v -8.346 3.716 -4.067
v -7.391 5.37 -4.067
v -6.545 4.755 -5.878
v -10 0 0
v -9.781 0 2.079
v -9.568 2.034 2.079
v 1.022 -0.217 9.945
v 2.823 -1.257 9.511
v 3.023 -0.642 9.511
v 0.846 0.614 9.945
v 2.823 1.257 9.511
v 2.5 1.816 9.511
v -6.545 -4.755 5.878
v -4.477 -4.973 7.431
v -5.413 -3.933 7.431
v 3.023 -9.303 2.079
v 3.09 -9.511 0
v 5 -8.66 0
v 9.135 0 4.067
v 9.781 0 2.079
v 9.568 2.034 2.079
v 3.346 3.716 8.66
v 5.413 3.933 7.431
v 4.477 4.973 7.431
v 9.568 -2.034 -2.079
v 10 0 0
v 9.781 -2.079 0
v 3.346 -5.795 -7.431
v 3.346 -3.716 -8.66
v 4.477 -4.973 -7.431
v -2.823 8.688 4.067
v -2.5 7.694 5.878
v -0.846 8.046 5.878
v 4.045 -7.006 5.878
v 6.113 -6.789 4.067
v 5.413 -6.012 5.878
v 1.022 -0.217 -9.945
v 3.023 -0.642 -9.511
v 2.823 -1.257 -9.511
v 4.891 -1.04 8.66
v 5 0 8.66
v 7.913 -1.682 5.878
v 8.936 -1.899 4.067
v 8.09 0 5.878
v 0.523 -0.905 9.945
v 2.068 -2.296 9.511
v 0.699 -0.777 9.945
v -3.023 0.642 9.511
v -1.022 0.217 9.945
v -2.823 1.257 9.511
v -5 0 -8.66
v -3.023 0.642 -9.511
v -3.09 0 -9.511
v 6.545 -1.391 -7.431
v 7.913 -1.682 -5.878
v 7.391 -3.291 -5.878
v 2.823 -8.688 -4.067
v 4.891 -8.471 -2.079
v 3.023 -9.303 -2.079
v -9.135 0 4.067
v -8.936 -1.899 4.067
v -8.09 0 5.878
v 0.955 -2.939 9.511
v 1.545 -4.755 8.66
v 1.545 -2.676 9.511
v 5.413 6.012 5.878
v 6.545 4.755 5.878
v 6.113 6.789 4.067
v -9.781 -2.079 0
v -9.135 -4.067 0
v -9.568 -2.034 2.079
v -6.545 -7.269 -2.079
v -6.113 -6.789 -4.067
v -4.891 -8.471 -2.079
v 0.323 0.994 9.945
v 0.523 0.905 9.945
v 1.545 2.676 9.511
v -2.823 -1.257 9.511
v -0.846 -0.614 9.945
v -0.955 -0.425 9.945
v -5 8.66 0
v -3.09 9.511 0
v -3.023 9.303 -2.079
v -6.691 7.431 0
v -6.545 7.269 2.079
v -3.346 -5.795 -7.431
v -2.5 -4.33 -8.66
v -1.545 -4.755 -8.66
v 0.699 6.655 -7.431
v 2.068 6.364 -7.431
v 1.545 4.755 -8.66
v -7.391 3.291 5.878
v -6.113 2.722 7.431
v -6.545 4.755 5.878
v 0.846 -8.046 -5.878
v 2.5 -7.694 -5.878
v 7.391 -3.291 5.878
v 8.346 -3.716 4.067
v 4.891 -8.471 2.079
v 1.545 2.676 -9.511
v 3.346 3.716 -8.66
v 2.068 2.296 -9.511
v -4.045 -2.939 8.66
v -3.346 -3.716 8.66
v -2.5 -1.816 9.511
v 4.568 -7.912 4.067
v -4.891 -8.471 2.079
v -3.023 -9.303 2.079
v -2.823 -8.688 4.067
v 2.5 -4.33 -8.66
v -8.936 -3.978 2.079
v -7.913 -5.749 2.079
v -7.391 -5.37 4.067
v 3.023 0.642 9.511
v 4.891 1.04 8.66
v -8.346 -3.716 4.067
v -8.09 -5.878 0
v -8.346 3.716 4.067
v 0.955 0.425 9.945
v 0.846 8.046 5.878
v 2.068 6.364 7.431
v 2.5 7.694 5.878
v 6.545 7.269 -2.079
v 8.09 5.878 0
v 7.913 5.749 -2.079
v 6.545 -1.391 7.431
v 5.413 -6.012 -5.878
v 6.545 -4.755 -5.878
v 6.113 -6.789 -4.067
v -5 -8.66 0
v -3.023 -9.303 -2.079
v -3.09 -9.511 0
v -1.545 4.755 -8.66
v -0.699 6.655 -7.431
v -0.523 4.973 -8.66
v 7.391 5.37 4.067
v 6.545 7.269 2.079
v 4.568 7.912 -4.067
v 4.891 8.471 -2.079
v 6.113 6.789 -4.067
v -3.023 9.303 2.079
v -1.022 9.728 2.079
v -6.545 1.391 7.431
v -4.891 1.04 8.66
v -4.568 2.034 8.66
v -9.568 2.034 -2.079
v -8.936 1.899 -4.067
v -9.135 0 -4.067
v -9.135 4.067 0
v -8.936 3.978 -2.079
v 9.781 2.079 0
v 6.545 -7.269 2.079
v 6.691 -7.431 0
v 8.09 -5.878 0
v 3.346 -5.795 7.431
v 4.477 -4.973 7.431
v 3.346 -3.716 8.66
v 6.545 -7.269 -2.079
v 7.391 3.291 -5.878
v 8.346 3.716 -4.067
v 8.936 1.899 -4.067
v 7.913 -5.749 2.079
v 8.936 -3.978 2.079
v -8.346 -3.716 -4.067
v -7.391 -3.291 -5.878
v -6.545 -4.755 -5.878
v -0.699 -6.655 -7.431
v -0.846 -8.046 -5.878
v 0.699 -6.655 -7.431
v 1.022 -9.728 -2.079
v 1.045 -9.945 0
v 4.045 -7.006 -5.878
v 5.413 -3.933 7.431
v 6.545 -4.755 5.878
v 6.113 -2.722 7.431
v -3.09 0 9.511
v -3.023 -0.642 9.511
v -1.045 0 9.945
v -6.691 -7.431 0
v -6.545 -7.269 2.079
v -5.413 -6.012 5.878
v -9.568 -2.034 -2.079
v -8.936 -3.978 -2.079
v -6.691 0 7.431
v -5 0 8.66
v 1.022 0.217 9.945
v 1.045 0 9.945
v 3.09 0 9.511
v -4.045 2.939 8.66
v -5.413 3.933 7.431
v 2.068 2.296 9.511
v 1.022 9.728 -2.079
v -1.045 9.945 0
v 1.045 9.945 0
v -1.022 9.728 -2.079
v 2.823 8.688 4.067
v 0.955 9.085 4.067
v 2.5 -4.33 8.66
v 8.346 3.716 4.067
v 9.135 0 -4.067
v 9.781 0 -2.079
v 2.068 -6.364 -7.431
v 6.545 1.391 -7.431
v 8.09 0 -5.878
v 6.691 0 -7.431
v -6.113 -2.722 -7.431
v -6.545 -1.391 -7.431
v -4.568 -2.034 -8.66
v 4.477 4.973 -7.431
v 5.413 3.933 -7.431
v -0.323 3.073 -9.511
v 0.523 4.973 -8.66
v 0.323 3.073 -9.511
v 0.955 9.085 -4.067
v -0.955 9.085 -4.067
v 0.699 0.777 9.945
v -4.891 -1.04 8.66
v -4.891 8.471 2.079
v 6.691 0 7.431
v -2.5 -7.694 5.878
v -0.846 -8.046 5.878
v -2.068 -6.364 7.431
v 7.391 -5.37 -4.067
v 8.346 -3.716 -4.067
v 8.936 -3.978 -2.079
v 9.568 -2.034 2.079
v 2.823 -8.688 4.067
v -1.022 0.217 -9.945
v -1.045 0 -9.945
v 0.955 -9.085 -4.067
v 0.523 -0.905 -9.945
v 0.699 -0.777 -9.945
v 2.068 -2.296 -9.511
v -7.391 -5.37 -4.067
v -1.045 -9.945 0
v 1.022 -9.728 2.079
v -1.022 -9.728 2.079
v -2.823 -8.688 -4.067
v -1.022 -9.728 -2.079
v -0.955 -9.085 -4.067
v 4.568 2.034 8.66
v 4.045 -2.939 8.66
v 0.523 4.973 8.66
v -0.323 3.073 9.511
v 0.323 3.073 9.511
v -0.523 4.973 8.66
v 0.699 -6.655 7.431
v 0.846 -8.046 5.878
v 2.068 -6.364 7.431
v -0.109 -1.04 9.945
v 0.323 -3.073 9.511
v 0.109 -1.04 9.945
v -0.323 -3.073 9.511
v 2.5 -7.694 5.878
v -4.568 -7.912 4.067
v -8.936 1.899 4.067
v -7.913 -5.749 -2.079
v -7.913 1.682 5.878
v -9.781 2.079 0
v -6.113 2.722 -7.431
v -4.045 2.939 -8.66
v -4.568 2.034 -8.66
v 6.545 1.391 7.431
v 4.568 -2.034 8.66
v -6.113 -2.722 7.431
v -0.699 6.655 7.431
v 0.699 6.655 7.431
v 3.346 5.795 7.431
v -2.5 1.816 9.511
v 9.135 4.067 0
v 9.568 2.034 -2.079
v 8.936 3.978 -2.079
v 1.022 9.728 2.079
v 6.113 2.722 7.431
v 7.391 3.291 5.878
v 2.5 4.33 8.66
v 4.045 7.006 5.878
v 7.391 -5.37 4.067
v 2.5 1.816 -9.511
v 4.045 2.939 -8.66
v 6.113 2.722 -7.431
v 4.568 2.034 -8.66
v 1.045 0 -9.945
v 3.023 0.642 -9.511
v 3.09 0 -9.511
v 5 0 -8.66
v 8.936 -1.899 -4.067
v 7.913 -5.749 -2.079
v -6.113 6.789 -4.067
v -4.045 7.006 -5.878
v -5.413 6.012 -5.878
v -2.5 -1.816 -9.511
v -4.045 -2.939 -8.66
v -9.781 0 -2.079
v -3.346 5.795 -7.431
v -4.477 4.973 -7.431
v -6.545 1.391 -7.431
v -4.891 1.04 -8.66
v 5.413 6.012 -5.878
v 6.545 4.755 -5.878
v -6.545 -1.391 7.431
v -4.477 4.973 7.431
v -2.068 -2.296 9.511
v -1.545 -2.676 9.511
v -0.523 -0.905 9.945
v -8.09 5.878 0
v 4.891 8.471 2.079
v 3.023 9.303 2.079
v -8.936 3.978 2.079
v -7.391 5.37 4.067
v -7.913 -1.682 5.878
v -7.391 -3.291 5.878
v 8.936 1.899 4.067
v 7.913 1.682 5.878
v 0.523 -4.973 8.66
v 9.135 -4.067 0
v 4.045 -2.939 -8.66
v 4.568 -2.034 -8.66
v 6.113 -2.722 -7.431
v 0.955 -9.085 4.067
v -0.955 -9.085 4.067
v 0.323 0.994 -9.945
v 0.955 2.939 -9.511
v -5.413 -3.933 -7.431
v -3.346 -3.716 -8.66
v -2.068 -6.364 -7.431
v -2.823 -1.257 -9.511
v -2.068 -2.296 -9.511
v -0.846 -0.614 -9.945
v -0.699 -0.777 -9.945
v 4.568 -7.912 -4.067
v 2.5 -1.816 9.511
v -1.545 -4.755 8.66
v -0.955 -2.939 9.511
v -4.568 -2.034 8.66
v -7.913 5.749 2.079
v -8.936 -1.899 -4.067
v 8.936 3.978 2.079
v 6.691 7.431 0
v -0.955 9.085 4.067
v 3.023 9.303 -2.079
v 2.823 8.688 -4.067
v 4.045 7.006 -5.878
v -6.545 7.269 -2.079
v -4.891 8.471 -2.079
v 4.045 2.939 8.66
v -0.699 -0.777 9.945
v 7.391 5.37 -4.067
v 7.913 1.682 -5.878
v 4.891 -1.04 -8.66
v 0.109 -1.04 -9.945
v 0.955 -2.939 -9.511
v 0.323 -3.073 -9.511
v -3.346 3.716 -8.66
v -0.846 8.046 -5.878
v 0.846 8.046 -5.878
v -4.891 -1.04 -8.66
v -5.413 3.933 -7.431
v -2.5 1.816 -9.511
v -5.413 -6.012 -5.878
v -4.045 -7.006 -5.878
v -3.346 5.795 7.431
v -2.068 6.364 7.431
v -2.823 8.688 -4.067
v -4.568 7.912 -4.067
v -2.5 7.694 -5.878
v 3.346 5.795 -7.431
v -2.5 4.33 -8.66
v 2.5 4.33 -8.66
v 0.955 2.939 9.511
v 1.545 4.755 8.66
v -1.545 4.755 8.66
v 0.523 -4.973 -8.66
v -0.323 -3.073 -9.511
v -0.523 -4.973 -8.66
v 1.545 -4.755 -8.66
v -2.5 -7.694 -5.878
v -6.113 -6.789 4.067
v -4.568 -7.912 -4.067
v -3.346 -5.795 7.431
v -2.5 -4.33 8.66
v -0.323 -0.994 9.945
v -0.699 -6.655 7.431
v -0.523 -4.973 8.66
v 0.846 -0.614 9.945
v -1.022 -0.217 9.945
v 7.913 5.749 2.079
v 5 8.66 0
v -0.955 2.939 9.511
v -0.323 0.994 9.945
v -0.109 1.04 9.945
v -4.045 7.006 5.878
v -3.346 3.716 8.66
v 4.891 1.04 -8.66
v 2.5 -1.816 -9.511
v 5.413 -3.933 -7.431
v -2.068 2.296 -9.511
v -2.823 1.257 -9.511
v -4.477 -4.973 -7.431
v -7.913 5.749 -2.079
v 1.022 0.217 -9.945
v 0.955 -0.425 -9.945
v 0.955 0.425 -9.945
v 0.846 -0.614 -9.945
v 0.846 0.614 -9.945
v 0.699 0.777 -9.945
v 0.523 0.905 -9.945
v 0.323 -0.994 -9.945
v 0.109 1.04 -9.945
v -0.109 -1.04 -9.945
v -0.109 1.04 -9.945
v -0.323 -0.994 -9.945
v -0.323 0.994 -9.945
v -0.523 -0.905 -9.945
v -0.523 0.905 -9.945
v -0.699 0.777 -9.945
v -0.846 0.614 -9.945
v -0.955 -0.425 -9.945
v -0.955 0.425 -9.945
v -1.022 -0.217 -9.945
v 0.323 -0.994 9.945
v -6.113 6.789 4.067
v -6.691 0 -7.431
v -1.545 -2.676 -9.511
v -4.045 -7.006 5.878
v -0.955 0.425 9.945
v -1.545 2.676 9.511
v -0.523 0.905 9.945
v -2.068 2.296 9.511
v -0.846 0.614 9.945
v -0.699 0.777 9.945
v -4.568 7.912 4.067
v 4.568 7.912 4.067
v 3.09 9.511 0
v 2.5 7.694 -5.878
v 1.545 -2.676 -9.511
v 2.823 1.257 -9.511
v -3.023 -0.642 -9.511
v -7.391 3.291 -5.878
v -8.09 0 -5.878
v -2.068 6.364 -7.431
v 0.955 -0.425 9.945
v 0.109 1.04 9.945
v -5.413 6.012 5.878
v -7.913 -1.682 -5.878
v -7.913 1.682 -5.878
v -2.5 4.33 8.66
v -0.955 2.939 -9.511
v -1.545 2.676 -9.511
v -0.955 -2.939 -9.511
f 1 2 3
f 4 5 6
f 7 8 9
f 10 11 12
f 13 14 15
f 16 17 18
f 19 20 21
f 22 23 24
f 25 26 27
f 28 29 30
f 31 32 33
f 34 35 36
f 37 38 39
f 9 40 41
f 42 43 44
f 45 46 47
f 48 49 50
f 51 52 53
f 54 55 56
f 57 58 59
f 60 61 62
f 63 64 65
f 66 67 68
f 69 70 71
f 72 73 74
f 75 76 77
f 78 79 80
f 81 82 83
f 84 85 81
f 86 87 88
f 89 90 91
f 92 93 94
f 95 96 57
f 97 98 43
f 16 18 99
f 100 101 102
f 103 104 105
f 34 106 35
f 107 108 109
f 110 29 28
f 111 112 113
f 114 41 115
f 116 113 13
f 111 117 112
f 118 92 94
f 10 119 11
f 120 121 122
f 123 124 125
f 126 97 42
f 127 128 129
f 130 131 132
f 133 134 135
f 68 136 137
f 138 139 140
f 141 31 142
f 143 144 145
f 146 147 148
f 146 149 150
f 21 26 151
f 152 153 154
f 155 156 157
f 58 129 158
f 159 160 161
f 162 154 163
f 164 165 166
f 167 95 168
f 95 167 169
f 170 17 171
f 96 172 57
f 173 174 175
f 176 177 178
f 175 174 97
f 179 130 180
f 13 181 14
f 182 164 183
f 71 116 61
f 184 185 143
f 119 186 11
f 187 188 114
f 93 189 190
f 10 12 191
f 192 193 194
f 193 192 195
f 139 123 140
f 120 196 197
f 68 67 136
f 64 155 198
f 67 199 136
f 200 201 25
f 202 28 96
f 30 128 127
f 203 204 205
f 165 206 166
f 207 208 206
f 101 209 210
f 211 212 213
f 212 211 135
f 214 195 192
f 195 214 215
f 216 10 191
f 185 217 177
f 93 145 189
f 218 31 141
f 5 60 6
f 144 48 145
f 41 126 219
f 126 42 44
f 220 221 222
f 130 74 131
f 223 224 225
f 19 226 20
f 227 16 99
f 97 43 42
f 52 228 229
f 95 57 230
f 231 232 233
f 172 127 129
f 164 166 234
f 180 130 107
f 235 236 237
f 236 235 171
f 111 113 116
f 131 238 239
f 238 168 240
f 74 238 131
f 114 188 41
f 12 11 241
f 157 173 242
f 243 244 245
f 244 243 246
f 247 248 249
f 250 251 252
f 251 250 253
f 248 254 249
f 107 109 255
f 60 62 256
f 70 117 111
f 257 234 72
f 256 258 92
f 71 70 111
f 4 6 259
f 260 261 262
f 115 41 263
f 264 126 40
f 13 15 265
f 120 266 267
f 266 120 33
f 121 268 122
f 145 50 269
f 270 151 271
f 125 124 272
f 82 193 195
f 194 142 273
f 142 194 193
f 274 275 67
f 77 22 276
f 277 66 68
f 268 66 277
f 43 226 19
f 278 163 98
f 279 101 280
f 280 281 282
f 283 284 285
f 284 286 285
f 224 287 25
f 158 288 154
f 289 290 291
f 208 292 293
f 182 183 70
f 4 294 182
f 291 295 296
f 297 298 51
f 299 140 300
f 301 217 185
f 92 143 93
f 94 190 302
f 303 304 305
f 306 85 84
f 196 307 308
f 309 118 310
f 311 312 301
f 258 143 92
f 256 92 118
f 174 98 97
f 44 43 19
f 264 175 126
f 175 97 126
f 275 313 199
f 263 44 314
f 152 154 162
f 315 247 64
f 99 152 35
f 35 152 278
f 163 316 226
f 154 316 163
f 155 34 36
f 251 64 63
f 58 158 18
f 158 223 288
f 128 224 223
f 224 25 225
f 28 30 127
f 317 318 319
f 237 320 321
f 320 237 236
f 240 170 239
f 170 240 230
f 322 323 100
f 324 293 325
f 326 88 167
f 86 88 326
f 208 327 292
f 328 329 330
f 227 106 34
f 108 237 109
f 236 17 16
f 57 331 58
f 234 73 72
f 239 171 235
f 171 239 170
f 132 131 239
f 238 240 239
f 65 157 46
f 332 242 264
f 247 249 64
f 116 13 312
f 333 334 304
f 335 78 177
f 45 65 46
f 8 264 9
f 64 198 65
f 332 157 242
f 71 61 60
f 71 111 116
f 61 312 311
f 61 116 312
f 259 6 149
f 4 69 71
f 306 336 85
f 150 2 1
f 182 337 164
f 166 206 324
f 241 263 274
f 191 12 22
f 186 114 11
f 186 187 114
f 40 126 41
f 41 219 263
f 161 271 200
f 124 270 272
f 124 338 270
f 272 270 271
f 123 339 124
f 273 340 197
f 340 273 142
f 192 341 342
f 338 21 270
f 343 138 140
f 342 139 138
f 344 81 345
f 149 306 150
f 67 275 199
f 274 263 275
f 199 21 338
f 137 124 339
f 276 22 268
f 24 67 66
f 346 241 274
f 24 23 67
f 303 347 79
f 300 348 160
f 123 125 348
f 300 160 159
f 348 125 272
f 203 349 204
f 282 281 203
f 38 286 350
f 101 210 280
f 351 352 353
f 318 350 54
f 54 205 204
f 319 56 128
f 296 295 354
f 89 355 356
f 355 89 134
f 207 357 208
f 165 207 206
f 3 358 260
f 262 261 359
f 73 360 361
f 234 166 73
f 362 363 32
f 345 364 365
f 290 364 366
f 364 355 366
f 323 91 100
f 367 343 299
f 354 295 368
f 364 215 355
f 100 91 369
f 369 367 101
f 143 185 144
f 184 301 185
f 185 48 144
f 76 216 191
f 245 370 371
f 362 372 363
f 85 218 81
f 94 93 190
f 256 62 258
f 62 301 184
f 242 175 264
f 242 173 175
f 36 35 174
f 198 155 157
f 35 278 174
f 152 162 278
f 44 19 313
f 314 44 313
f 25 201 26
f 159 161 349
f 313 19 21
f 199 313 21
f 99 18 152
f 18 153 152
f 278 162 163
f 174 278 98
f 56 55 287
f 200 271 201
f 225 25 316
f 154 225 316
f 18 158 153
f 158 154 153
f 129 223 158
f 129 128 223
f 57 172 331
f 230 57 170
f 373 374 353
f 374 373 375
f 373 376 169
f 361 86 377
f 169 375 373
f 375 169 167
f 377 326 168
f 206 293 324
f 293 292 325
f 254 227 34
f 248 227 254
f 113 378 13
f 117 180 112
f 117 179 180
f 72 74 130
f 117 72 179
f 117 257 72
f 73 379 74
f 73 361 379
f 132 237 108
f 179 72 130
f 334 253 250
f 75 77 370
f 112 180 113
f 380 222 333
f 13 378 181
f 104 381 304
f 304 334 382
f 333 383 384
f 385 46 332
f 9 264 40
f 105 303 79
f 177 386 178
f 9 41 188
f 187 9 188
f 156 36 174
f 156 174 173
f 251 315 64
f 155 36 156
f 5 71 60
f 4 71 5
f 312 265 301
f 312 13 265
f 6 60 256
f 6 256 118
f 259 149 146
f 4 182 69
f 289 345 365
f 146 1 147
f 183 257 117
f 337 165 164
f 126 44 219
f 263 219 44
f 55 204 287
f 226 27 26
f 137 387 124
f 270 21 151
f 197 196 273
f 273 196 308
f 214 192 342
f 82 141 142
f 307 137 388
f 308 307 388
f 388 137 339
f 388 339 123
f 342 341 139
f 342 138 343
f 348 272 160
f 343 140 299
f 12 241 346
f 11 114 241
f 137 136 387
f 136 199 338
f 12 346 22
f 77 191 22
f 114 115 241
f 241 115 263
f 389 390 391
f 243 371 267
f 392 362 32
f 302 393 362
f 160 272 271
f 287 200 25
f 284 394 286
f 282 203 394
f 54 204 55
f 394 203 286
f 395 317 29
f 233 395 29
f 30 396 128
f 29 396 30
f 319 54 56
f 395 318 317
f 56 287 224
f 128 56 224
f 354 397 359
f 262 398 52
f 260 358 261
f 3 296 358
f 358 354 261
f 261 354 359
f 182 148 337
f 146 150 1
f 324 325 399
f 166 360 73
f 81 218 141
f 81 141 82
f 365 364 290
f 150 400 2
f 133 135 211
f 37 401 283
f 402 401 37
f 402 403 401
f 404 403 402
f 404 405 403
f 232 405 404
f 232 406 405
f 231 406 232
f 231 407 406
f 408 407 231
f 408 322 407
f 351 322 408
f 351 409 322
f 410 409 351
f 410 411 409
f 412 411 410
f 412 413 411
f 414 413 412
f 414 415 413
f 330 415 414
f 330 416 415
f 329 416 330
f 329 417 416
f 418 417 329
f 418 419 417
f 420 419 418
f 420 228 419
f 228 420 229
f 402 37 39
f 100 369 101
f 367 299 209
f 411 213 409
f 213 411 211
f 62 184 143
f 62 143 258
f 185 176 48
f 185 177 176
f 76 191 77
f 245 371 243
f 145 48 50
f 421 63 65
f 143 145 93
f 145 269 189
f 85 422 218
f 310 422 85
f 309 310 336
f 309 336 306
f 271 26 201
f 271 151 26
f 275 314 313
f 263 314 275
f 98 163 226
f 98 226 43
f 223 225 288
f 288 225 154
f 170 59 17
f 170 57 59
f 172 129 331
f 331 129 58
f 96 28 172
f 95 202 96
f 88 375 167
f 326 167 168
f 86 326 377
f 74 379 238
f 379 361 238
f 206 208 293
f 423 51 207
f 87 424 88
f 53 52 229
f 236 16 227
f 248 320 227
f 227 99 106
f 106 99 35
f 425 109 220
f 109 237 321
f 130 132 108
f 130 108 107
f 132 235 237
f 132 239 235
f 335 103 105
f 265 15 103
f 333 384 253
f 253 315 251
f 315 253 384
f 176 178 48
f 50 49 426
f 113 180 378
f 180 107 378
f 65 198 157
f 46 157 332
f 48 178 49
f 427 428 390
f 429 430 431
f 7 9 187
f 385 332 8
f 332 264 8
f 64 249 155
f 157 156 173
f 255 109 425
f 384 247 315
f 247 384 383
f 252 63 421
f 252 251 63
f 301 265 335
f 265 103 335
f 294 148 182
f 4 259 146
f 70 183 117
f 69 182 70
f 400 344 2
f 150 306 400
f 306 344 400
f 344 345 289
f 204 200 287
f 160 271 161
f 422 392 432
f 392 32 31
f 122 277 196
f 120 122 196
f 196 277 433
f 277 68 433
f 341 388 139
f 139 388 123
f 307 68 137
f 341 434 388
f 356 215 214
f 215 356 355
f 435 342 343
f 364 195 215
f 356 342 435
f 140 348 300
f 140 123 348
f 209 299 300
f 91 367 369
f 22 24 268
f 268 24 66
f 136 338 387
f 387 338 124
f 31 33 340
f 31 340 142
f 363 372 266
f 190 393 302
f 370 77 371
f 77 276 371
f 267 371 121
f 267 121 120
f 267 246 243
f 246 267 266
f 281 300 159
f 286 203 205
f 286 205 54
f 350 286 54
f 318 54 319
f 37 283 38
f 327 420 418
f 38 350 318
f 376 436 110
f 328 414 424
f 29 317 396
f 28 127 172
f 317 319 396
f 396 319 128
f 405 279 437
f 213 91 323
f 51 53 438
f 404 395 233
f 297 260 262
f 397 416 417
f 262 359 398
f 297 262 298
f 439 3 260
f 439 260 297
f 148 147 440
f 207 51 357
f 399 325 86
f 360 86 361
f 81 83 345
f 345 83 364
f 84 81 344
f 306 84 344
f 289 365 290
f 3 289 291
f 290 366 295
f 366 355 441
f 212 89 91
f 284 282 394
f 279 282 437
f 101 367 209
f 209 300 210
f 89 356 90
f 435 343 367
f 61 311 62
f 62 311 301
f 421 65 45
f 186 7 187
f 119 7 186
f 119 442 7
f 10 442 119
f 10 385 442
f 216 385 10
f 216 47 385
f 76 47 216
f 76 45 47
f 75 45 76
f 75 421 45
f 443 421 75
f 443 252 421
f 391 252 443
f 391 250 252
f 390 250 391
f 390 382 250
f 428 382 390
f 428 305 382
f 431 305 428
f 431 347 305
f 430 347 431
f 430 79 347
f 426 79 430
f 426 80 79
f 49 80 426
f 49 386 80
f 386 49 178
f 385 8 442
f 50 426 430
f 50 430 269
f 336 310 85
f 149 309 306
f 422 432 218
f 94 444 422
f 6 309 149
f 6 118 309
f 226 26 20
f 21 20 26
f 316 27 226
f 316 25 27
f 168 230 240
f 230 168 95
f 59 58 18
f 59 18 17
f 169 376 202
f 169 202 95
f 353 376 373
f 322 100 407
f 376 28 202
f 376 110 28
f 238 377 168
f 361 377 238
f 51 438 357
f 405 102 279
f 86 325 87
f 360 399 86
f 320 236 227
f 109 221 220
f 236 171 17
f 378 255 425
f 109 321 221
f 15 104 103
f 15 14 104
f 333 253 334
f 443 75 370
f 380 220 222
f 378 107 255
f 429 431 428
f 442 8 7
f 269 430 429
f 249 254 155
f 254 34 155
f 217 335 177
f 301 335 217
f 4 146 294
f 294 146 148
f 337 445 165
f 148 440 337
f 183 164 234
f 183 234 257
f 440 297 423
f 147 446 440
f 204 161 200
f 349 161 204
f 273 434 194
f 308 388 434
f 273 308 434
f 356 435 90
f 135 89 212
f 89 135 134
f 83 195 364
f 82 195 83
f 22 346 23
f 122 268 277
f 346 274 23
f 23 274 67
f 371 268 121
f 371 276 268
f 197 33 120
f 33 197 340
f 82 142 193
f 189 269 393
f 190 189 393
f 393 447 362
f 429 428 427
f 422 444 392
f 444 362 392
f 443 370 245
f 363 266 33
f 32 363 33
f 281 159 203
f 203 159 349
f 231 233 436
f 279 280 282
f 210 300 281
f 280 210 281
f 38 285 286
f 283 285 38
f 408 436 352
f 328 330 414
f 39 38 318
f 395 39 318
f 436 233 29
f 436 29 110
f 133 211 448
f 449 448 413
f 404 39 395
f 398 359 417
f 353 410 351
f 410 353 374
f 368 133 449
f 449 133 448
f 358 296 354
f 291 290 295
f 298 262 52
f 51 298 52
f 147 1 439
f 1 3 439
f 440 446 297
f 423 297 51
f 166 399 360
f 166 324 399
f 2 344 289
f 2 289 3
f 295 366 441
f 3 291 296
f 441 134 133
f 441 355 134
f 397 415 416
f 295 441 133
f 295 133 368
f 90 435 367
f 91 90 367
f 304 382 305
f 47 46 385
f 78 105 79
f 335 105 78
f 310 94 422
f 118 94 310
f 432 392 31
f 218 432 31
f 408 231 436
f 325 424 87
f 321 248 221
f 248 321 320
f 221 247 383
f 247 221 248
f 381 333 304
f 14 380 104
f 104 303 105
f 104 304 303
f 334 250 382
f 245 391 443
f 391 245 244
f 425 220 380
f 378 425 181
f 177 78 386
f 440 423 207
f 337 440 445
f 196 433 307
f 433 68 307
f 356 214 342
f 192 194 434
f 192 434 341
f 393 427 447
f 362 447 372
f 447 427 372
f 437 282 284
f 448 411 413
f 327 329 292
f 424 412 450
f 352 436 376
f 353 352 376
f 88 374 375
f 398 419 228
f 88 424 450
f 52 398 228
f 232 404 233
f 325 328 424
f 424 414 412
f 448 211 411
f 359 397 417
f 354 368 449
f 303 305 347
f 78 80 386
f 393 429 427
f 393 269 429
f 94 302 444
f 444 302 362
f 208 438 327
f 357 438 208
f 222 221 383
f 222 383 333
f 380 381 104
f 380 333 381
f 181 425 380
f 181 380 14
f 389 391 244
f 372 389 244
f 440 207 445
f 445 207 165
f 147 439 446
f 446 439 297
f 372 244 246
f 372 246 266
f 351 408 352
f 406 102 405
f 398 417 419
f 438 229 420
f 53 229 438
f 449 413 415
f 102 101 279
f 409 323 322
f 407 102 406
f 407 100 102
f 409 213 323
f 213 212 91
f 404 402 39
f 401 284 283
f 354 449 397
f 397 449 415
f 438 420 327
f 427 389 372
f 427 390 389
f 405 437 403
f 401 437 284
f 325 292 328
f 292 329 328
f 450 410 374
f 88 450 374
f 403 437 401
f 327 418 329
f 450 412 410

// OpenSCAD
// Volume: 4112.861654538725, SurfaceArea: 1245.2051191189146
module transparent() {
 %children();
}

difference() {
  sphere(r=10);
  transparent() cylinder(h=30, r=6, center=true);
}
